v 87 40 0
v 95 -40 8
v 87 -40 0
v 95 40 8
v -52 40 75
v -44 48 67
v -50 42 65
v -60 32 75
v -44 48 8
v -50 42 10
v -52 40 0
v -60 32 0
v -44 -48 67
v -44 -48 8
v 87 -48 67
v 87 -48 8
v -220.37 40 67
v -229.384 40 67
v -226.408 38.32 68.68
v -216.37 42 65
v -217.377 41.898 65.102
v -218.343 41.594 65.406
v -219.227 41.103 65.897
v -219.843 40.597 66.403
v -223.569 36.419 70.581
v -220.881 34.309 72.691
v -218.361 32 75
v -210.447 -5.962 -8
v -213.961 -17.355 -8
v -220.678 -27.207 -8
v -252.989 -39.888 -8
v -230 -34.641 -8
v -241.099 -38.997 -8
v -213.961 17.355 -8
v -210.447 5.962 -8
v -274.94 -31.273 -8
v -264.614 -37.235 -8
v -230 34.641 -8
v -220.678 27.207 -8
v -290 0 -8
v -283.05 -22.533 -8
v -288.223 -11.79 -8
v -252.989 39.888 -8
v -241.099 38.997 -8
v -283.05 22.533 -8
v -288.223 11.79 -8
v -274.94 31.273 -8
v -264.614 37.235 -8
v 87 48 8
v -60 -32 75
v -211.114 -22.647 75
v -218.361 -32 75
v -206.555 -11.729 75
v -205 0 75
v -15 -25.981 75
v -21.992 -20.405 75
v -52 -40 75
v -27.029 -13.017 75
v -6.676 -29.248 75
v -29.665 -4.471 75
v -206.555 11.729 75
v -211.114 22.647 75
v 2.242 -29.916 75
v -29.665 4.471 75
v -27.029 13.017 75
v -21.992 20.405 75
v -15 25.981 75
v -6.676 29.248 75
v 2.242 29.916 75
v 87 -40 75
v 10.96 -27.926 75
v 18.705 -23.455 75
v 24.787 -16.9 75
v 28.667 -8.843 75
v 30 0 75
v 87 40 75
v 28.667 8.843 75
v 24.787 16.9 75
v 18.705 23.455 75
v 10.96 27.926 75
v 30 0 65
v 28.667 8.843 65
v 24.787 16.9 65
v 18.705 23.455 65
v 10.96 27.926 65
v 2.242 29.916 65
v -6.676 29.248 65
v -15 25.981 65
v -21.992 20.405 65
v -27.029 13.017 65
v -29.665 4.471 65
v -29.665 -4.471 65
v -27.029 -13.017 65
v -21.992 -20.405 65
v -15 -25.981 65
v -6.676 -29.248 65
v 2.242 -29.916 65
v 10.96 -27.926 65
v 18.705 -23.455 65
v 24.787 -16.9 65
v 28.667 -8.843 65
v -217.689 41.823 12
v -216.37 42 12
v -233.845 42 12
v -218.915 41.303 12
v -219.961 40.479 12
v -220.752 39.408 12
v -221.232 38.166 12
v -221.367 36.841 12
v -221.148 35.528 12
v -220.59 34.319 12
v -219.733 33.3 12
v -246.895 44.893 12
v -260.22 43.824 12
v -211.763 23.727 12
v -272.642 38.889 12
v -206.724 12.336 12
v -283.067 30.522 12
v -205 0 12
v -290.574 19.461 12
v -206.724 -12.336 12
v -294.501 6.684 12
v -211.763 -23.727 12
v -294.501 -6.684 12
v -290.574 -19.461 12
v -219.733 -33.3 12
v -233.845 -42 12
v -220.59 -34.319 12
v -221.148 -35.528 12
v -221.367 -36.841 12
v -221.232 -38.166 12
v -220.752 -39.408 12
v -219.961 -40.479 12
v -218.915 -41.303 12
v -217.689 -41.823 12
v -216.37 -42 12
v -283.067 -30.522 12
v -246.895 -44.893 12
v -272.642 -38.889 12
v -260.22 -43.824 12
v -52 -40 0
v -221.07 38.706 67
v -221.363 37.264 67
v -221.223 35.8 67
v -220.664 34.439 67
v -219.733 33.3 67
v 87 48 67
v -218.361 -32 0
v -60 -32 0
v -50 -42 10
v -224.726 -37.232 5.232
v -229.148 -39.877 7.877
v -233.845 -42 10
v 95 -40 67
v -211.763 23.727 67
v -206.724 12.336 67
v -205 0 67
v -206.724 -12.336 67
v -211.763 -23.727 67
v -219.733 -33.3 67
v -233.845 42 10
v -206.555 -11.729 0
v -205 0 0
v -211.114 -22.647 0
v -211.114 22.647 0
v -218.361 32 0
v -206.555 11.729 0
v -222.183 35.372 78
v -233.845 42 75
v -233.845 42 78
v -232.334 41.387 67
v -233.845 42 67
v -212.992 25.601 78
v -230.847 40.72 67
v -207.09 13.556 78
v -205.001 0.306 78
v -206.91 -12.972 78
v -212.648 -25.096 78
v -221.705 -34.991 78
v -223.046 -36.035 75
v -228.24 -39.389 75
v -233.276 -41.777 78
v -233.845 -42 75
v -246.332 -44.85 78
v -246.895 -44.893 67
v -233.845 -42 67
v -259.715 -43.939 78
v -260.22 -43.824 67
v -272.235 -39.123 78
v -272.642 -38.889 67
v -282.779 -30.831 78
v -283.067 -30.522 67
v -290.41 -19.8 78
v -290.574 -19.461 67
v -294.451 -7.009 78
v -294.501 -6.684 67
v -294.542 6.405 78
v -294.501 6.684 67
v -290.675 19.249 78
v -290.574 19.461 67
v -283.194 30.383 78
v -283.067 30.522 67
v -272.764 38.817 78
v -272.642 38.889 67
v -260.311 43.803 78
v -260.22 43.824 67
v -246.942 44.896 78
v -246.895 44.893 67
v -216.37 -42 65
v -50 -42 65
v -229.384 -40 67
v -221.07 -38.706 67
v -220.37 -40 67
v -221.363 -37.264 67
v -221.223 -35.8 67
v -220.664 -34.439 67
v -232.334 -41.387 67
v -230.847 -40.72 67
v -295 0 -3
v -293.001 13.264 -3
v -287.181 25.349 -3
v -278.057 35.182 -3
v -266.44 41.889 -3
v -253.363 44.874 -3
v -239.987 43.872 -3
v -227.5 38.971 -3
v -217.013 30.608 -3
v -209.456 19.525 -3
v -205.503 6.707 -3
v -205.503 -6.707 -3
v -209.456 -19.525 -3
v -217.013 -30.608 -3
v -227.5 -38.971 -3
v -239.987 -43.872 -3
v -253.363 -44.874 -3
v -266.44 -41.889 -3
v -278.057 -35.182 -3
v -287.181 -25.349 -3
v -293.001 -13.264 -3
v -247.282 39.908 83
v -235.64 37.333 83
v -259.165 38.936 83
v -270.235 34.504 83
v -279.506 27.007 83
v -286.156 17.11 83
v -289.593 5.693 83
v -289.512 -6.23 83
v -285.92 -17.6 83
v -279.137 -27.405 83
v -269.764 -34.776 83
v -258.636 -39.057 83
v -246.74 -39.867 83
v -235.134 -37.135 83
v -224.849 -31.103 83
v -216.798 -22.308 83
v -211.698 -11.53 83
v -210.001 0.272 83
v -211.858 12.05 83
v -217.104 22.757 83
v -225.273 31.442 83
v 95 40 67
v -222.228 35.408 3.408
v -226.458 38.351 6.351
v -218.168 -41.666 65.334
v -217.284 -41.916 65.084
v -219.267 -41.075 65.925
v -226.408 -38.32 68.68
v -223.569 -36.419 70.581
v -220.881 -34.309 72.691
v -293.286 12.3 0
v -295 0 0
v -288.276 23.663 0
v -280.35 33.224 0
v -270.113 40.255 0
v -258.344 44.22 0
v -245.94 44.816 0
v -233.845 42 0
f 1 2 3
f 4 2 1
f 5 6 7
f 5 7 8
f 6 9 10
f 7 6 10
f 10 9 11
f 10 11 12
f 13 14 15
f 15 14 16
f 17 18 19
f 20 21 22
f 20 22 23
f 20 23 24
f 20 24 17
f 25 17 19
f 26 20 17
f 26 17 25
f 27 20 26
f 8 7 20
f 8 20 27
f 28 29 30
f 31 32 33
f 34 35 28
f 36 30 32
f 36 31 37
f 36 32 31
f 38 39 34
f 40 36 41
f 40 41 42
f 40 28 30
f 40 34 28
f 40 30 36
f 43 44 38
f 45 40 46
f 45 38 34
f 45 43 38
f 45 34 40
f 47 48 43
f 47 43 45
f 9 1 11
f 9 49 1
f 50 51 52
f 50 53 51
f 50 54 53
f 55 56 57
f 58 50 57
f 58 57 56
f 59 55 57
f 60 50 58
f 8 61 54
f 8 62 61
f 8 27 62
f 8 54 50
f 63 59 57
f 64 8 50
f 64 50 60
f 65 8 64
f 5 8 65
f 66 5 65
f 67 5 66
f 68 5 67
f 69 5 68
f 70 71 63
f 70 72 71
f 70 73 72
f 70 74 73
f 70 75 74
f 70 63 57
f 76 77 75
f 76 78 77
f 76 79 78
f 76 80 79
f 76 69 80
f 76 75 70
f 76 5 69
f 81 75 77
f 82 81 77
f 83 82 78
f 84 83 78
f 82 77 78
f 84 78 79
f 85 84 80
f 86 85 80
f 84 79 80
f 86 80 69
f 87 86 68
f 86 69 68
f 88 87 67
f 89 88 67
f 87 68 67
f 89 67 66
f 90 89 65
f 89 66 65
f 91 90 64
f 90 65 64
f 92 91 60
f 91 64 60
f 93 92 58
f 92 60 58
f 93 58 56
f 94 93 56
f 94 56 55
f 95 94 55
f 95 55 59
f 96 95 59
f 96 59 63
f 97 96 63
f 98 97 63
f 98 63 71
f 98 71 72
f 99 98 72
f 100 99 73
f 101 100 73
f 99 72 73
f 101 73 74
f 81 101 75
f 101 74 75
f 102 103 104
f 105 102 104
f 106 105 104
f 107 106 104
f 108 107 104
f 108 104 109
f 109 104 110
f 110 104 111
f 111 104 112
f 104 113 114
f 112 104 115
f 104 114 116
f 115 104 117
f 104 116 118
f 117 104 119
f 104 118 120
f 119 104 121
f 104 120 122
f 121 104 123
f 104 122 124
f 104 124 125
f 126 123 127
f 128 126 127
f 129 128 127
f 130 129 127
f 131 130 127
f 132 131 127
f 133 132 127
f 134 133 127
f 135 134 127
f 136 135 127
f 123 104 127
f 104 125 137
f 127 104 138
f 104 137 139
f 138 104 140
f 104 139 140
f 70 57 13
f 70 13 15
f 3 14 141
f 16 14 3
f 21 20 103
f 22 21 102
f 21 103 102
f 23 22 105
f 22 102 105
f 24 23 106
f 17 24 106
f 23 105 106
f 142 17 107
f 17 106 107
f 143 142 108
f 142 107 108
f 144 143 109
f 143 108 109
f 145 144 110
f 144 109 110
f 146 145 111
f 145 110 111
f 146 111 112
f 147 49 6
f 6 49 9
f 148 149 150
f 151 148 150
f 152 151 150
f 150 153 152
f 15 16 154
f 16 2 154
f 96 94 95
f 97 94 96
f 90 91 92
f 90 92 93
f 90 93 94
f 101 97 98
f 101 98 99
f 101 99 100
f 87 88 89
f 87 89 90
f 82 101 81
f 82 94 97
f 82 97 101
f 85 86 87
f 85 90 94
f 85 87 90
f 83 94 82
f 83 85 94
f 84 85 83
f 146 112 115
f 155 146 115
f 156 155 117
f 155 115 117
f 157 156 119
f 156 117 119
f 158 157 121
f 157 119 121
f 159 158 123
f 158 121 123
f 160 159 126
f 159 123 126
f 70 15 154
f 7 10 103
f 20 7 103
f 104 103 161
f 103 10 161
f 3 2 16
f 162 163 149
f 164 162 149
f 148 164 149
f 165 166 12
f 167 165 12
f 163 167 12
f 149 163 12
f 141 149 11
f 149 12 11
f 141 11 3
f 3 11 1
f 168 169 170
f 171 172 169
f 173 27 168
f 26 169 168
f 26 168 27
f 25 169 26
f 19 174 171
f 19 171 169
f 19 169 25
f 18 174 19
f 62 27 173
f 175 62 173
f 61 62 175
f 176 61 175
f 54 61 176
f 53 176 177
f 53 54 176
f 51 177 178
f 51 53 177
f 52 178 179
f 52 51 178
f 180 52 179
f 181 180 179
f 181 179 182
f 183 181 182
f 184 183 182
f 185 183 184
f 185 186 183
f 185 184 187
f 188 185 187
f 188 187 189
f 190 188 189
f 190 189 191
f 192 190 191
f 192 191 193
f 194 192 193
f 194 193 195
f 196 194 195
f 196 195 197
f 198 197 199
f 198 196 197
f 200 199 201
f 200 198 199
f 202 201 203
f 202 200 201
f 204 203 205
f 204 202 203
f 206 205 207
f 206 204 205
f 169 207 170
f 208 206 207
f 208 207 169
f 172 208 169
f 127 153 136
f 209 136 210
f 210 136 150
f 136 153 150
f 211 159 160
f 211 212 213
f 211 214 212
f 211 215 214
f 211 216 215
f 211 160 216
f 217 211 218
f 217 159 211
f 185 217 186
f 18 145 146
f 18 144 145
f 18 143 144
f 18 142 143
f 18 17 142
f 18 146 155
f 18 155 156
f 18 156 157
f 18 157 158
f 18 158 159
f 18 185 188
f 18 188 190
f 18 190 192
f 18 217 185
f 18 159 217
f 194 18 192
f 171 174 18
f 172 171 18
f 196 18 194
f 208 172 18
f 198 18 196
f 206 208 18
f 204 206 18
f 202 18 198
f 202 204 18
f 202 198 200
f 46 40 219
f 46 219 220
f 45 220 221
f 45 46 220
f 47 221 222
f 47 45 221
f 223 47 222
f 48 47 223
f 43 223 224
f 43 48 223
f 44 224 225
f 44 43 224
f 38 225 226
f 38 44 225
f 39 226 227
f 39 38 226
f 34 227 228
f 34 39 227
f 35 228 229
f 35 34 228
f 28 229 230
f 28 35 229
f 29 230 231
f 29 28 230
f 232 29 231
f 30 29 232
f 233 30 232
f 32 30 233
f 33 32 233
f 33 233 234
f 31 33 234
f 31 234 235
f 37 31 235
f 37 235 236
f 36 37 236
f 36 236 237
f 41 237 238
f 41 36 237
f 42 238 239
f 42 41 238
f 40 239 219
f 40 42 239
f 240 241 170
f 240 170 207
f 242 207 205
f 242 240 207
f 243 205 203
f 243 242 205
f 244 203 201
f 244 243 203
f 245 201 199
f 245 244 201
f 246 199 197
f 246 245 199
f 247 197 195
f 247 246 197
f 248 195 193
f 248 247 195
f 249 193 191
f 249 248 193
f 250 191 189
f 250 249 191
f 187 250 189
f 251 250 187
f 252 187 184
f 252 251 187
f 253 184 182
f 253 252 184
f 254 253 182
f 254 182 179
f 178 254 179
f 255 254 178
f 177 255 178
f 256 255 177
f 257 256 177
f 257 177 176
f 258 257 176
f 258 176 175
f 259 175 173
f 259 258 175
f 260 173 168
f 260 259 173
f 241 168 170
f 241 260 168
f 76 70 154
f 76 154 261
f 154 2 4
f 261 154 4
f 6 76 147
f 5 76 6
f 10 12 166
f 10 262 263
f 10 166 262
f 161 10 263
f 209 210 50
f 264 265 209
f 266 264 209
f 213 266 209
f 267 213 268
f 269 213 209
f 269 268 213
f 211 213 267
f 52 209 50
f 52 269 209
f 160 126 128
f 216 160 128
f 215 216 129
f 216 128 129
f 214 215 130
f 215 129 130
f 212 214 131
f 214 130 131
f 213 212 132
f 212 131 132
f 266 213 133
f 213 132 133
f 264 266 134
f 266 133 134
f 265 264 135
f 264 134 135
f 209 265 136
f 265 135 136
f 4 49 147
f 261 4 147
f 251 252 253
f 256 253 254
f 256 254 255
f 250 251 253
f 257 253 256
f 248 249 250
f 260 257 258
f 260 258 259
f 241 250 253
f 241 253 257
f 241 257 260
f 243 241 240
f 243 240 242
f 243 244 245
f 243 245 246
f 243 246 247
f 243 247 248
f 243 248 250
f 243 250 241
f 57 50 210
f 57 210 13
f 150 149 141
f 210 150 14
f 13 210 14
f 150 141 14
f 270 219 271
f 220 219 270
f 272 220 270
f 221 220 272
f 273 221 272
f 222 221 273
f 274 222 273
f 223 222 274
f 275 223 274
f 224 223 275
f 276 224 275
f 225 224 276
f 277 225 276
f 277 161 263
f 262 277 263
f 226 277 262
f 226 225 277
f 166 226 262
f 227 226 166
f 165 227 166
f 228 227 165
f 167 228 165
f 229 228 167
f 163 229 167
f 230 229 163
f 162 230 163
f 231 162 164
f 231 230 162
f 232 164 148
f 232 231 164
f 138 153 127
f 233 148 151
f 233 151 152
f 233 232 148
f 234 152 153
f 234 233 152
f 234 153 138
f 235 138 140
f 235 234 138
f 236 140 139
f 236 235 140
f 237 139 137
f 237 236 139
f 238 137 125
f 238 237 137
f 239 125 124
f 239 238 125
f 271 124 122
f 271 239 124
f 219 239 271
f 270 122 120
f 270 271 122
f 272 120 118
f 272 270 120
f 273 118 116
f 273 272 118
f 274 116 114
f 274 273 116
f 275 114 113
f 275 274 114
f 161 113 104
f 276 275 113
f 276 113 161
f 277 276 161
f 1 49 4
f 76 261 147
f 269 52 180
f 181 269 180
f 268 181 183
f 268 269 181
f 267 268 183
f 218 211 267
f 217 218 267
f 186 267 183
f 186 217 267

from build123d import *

# Parameters (mm, degrees)
BOSS_EXTRU_1_DEPTH = 75
SKETCH3_R          = 30
CUT_EXTRUDE3_DEPTH = 10
ESQUISSE2_R        = 45
BOSS_EXTRU_2_DEPTH = 8
CHANFREIN1_SIZE    = 5
BOSS_EXTRU_3_START = 8
ESQUISSE3_R        = 45
BOSS_EXTRU_3_DEPTH = 8
CHANFREIN2_SIZE    = 5
D_POUILLE5_ANGLE   = 45
D_POUILLE6_ANGLE   = 45
CHANFREIN4_SIZE    = 10
SKETCH2_R          = 45
CUT_EXTRUDE2_DEPTH = 55
FILLET1_R          = 5
CHAMFER1_SIZE      = 8


with BuildPart() as part:
    # Esquisse1 → Boss.-Extru.1 (new body)
    with BuildSketch(Plane.XY):
        with BuildLine():
            Line((95, -48), (95, 48))
            Line((95, 48), (-50, 48))
            Line((-50, 48), (-50, 42))
            Line((-50, 42), (-233.844505579, 42))
            ThreePointArc((-233.844505579, 42), (-295, 0), (-233.844505579, -42))
            Line((-233.844505579, -42), (-50, -42))
            Line((-50, -42), (-50, -48))
            Line((-50, -48), (95, -48))
        make_face()
    extrude(amount=BOSS_EXTRU_1_DEPTH)

    # Sketch3 → Cut-Extrude3 (cut)
    with BuildSketch(Plane.XY.offset(75)):
        Circle(SKETCH3_R)
    extrude(amount=-CUT_EXTRUDE3_DEPTH, mode=Mode.SUBTRACT)

    # Esquisse2 → Boss.-Extru.2 (add)
    with BuildSketch(Plane.XY.offset(75)):
        with Locations(Location((-250, 0, 0), (0, 0, 68.960530219))):
            Circle(ESQUISSE2_R)
    extrude(amount=BOSS_EXTRU_2_DEPTH)

    # Chanfrein1
    chanfrein1_edges = [part.edges().sort_by_distance(p)[0] for p in [
        (-266.155494421, -42, 83),
    ]]
    chamfer(chanfrein1_edges, length=CHANFREIN1_SIZE)

    # Esquisse3 → Boss.-Extru.3 (add)
    with BuildSketch(Plane(origin=(0, 0, 0), x_dir=(-1, 0, 0), z_dir=(0, 0, -1)).offset(BOSS_EXTRU_3_START)):
        with Locations((250, 0)):
            Circle(ESQUISSE3_R)
    extrude(amount=-BOSS_EXTRU_3_DEPTH)

    # Chanfrein2
    chanfrein2_edges = [part.edges().sort_by_distance(p)[0] for p in [
        (-205, 0, -8),
    ]]
    chamfer(chanfrein2_edges, length=CHANFREIN2_SIZE)

    # Dépouille5
    d_pouille5_faces = [part.faces().sort_by_distance(p)[0] for p in [
        (-50, 45, 37.5),
    ]]
    draft(d_pouille5_faces, Plane(origin=(-50, 42, 75), x_dir=(1, 0, 0), z_dir=(0, 1, 0)), D_POUILLE5_ANGLE)

    # Dépouille6
    d_pouille6_faces = [part.faces().sort_by_distance(p)[0] for p in [
        (-50, -45, 37.5),
    ]]
    draft(d_pouille6_faces, Plane(origin=(-50, -42, 75), x_dir=(-1, 0, 0), z_dir=(0, -1, 0)), D_POUILLE6_ANGLE)

    # Chanfrein4
    # the kernel refuses this chamfer: 10 mm, written as the material it takes off along each edge
    with BuildSketch(Plane(origin=(-259.561335458, -42, 75), x_dir=(0, -0.027495876610586317, -0.9996219169112968), z_dir=(1, 0, 0))) as chanfrein4_piece_1_section:
        Polygon((CHANFREIN4_SIZE * 0.999621916911, CHANFREIN4_SIZE * 0.0274958766106), (-CHANFREIN4_SIZE * 0.0274958766106, CHANFREIN4_SIZE * 0.999621916911), (0, 0), align=None)
    chanfrein4_piece_1 = extrude(amount=235.278165338, mode=Mode.PRIVATE)
    chanfrein4_piece_1 = chanfrein4_piece_1 - Plane(origin=(-250, 0, 71.650306889), x_dir=(0.35901098714230106, 0.9333333333333331, 0), z_dir=(0, 0, -1)) * Cylinder(45, 511, mode=Mode.PRIVATE)
    chanfrein4_piece_1 = split(chanfrein4_piece_1, bisect_by=Plane(origin=(-96.832103128, 4.832103128, 71.650306889), z_dir=(-0.7071067811865462, -0.7071067811865488, 0)), keep=Keep.TOP, mode=Mode.PRIVATE)
    add(chanfrein4_piece_1, mode=Mode.SUBTRACT)
    with BuildSketch(Plane(origin=(-259.561335458, -42, 0), x_dir=(0, 0.9996219169112968, -0.027495876610586372), z_dir=(1, 0, 0))) as chanfrein4_piece_2_section:
        Polygon((CHANFREIN4_SIZE * 0.999621916911, CHANFREIN4_SIZE * 0.0274958766106), (-CHANFREIN4_SIZE * 0.0274958766106, CHANFREIN4_SIZE * 0.999621916911), (0, 0), align=None)
    chanfrein4_piece_2 = extrude(amount=235.278165338, mode=Mode.PRIVATE)
    chanfrein4_piece_2 = chanfrein4_piece_2 - Plane(origin=(-250, 0, 3.349693111), x_dir=(-1, 0, 0), z_dir=(0, 0, -1)) * Cylinder(45, 511, mode=Mode.PRIVATE)
    chanfrein4_piece_2 = split(chanfrein4_piece_2, bisect_by=Plane(origin=(-96.832103062, 4.832103062, 3.349693111), z_dir=(-0.7071067811865462, -0.7071067811865488, 0)), keep=Keep.TOP, mode=Mode.PRIVATE)
    add(chanfrein4_piece_2, mode=Mode.SUBTRACT)
    with BuildSketch(Plane(origin=(-24.28317012, 42, 0), x_dir=(0, -0.9996219169112968, -0.027495876610586372), z_dir=(-1, 0, 0))) as chanfrein4_piece_3_section:
        Polygon((CHANFREIN4_SIZE * 0.999621916911, CHANFREIN4_SIZE * 0.0274958766106), (-CHANFREIN4_SIZE * 0.0274958766106, CHANFREIN4_SIZE * 0.999621916911), (0, 0), align=None)
    chanfrein4_piece_3 = extrude(amount=235.278165338, mode=Mode.PRIVATE)
    chanfrein4_piece_3 = chanfrein4_piece_3 - Plane(origin=(-250, 0, 3.349693112), x_dir=(-1, 0, 0), z_dir=(0, 0, -1)) * Cylinder(45, 511, mode=Mode.PRIVATE)
    chanfrein4_piece_3 = split(chanfrein4_piece_3, bisect_by=Plane(origin=(-96.832103108, -4.832103108, 3.349693112), z_dir=(-0.7071067811865462, 0.7071067811865488, 0)), keep=Keep.TOP, mode=Mode.PRIVATE)
    add(chanfrein4_piece_3, mode=Mode.SUBTRACT)
    with BuildSketch(Plane(origin=(-24.28317012, 42, 75), x_dir=(0, 0.027495876610586317, -0.9996219169112968), z_dir=(-1, 0, 0))) as chanfrein4_piece_4_section:
        Polygon((CHANFREIN4_SIZE * 0.999621916911, CHANFREIN4_SIZE * 0.0274958766106), (-CHANFREIN4_SIZE * 0.0274958766106, CHANFREIN4_SIZE * 0.999621916911), (0, 0), align=None)
    chanfrein4_piece_4 = extrude(amount=235.278165338, mode=Mode.PRIVATE)
    chanfrein4_piece_4 = chanfrein4_piece_4 - Plane(origin=(-250, 0, 71.65030689), x_dir=(0.35901098714230106, 0.9333333333333331, 0), z_dir=(0, 0, -1)) * Cylinder(45, 511, mode=Mode.PRIVATE)
    chanfrein4_piece_4 = split(chanfrein4_piece_4, bisect_by=Plane(origin=(-96.832103072, -4.832103072, 71.65030689), z_dir=(-0.7071067811865462, 0.7071067811865488, 0)), keep=Keep.TOP, mode=Mode.PRIVATE)
    add(chanfrein4_piece_4, mode=Mode.SUBTRACT)

    # Sketch2 → Cut-Extrude2 (cut)
    with BuildSketch(Plane(origin=(0, 0, 12), x_dir=(-1, 0, 0), z_dir=(0, 0, -1))):
        with Locations(Location((250, 0, 0), (0, 0, 242.733955549))):
            Circle(SKETCH2_R)
    extrude(amount=-CUT_EXTRUDE2_DEPTH, mode=Mode.SUBTRACT)

    # Fillet1
    # the kernel refuses this fillet: 5 mm, written as the material it takes off along each edge
    with BuildSketch(Plane(origin=(-233.844505579, -42, 12), x_dir=(0.8512324625883901, 0.5247888095564778, 0), z_dir=(0, 0, 1))) as fillet1_piece_1_section:
        with BuildLine():
            CenterArc((17.499102813, -4.914442902), FILLET1_R, 100.614557324, 137.73141557)
            Line((14.875158765, -9.170605214), (0, 0))
            ThreePointArc((0, 0), (8.289048701, -0.770013886), (16.578097401, 0))
        make_face()
    fillet1_piece_1 = extrude(amount=96.68712255, mode=Mode.PRIVATE)
    fillet1_piece_1 = split(fillet1_piece_1, bisect_by=Plane(origin=(-224.59334288, -39.762552666, 67), z_dir=(0, 0, -1)), keep=Keep.TOP, mode=Mode.PRIVATE)
    add(fillet1_piece_1, mode=Mode.SUBTRACT)
    with BuildSketch(Plane(origin=(-233.844505579, 42, 12), x_dir=(0.8512324625883905, -0.5247888095564773, 0), z_dir=(0, 0, 1))) as fillet1_piece_2_section:
        with BuildLine():
            CenterArc((17.499102813, 4.914442902), FILLET1_R, 121.654027105, 137.73141557)
            Line((14.875158765, 9.170605214), (0, 0))
            ThreePointArc((0, 0), (8.289048701, 0.770013886), (16.578097401, 0))
        make_face()
    fillet1_piece_2 = extrude(amount=96.68712255, mode=Mode.PRIVATE)
    fillet1_piece_2 = split(fillet1_piece_2, bisect_by=Plane(origin=(-224.59334288, 39.762552666, 67), z_dir=(0, 0, -1)), keep=Keep.TOP, mode=Mode.PRIVATE)
    add(fillet1_piece_2, mode=Mode.SUBTRACT)

    # Chamfer1
    chamfer1_edges = [part.edges().sort_by_distance(p)[0] for p in [
        (25.5, 48, 0),
        (95, 48, 37.5),
        (95, -48, 37.5),
        (25.5, -48, 75),
        (95, 0, 75),
        (25.5, 48, 75),
        (95, 0, 0),
        (25.5, -48, 0),
    ]]
    chamfer(chamfer1_edges, length=CHAMFER1_SIZE)


solid = part.part
